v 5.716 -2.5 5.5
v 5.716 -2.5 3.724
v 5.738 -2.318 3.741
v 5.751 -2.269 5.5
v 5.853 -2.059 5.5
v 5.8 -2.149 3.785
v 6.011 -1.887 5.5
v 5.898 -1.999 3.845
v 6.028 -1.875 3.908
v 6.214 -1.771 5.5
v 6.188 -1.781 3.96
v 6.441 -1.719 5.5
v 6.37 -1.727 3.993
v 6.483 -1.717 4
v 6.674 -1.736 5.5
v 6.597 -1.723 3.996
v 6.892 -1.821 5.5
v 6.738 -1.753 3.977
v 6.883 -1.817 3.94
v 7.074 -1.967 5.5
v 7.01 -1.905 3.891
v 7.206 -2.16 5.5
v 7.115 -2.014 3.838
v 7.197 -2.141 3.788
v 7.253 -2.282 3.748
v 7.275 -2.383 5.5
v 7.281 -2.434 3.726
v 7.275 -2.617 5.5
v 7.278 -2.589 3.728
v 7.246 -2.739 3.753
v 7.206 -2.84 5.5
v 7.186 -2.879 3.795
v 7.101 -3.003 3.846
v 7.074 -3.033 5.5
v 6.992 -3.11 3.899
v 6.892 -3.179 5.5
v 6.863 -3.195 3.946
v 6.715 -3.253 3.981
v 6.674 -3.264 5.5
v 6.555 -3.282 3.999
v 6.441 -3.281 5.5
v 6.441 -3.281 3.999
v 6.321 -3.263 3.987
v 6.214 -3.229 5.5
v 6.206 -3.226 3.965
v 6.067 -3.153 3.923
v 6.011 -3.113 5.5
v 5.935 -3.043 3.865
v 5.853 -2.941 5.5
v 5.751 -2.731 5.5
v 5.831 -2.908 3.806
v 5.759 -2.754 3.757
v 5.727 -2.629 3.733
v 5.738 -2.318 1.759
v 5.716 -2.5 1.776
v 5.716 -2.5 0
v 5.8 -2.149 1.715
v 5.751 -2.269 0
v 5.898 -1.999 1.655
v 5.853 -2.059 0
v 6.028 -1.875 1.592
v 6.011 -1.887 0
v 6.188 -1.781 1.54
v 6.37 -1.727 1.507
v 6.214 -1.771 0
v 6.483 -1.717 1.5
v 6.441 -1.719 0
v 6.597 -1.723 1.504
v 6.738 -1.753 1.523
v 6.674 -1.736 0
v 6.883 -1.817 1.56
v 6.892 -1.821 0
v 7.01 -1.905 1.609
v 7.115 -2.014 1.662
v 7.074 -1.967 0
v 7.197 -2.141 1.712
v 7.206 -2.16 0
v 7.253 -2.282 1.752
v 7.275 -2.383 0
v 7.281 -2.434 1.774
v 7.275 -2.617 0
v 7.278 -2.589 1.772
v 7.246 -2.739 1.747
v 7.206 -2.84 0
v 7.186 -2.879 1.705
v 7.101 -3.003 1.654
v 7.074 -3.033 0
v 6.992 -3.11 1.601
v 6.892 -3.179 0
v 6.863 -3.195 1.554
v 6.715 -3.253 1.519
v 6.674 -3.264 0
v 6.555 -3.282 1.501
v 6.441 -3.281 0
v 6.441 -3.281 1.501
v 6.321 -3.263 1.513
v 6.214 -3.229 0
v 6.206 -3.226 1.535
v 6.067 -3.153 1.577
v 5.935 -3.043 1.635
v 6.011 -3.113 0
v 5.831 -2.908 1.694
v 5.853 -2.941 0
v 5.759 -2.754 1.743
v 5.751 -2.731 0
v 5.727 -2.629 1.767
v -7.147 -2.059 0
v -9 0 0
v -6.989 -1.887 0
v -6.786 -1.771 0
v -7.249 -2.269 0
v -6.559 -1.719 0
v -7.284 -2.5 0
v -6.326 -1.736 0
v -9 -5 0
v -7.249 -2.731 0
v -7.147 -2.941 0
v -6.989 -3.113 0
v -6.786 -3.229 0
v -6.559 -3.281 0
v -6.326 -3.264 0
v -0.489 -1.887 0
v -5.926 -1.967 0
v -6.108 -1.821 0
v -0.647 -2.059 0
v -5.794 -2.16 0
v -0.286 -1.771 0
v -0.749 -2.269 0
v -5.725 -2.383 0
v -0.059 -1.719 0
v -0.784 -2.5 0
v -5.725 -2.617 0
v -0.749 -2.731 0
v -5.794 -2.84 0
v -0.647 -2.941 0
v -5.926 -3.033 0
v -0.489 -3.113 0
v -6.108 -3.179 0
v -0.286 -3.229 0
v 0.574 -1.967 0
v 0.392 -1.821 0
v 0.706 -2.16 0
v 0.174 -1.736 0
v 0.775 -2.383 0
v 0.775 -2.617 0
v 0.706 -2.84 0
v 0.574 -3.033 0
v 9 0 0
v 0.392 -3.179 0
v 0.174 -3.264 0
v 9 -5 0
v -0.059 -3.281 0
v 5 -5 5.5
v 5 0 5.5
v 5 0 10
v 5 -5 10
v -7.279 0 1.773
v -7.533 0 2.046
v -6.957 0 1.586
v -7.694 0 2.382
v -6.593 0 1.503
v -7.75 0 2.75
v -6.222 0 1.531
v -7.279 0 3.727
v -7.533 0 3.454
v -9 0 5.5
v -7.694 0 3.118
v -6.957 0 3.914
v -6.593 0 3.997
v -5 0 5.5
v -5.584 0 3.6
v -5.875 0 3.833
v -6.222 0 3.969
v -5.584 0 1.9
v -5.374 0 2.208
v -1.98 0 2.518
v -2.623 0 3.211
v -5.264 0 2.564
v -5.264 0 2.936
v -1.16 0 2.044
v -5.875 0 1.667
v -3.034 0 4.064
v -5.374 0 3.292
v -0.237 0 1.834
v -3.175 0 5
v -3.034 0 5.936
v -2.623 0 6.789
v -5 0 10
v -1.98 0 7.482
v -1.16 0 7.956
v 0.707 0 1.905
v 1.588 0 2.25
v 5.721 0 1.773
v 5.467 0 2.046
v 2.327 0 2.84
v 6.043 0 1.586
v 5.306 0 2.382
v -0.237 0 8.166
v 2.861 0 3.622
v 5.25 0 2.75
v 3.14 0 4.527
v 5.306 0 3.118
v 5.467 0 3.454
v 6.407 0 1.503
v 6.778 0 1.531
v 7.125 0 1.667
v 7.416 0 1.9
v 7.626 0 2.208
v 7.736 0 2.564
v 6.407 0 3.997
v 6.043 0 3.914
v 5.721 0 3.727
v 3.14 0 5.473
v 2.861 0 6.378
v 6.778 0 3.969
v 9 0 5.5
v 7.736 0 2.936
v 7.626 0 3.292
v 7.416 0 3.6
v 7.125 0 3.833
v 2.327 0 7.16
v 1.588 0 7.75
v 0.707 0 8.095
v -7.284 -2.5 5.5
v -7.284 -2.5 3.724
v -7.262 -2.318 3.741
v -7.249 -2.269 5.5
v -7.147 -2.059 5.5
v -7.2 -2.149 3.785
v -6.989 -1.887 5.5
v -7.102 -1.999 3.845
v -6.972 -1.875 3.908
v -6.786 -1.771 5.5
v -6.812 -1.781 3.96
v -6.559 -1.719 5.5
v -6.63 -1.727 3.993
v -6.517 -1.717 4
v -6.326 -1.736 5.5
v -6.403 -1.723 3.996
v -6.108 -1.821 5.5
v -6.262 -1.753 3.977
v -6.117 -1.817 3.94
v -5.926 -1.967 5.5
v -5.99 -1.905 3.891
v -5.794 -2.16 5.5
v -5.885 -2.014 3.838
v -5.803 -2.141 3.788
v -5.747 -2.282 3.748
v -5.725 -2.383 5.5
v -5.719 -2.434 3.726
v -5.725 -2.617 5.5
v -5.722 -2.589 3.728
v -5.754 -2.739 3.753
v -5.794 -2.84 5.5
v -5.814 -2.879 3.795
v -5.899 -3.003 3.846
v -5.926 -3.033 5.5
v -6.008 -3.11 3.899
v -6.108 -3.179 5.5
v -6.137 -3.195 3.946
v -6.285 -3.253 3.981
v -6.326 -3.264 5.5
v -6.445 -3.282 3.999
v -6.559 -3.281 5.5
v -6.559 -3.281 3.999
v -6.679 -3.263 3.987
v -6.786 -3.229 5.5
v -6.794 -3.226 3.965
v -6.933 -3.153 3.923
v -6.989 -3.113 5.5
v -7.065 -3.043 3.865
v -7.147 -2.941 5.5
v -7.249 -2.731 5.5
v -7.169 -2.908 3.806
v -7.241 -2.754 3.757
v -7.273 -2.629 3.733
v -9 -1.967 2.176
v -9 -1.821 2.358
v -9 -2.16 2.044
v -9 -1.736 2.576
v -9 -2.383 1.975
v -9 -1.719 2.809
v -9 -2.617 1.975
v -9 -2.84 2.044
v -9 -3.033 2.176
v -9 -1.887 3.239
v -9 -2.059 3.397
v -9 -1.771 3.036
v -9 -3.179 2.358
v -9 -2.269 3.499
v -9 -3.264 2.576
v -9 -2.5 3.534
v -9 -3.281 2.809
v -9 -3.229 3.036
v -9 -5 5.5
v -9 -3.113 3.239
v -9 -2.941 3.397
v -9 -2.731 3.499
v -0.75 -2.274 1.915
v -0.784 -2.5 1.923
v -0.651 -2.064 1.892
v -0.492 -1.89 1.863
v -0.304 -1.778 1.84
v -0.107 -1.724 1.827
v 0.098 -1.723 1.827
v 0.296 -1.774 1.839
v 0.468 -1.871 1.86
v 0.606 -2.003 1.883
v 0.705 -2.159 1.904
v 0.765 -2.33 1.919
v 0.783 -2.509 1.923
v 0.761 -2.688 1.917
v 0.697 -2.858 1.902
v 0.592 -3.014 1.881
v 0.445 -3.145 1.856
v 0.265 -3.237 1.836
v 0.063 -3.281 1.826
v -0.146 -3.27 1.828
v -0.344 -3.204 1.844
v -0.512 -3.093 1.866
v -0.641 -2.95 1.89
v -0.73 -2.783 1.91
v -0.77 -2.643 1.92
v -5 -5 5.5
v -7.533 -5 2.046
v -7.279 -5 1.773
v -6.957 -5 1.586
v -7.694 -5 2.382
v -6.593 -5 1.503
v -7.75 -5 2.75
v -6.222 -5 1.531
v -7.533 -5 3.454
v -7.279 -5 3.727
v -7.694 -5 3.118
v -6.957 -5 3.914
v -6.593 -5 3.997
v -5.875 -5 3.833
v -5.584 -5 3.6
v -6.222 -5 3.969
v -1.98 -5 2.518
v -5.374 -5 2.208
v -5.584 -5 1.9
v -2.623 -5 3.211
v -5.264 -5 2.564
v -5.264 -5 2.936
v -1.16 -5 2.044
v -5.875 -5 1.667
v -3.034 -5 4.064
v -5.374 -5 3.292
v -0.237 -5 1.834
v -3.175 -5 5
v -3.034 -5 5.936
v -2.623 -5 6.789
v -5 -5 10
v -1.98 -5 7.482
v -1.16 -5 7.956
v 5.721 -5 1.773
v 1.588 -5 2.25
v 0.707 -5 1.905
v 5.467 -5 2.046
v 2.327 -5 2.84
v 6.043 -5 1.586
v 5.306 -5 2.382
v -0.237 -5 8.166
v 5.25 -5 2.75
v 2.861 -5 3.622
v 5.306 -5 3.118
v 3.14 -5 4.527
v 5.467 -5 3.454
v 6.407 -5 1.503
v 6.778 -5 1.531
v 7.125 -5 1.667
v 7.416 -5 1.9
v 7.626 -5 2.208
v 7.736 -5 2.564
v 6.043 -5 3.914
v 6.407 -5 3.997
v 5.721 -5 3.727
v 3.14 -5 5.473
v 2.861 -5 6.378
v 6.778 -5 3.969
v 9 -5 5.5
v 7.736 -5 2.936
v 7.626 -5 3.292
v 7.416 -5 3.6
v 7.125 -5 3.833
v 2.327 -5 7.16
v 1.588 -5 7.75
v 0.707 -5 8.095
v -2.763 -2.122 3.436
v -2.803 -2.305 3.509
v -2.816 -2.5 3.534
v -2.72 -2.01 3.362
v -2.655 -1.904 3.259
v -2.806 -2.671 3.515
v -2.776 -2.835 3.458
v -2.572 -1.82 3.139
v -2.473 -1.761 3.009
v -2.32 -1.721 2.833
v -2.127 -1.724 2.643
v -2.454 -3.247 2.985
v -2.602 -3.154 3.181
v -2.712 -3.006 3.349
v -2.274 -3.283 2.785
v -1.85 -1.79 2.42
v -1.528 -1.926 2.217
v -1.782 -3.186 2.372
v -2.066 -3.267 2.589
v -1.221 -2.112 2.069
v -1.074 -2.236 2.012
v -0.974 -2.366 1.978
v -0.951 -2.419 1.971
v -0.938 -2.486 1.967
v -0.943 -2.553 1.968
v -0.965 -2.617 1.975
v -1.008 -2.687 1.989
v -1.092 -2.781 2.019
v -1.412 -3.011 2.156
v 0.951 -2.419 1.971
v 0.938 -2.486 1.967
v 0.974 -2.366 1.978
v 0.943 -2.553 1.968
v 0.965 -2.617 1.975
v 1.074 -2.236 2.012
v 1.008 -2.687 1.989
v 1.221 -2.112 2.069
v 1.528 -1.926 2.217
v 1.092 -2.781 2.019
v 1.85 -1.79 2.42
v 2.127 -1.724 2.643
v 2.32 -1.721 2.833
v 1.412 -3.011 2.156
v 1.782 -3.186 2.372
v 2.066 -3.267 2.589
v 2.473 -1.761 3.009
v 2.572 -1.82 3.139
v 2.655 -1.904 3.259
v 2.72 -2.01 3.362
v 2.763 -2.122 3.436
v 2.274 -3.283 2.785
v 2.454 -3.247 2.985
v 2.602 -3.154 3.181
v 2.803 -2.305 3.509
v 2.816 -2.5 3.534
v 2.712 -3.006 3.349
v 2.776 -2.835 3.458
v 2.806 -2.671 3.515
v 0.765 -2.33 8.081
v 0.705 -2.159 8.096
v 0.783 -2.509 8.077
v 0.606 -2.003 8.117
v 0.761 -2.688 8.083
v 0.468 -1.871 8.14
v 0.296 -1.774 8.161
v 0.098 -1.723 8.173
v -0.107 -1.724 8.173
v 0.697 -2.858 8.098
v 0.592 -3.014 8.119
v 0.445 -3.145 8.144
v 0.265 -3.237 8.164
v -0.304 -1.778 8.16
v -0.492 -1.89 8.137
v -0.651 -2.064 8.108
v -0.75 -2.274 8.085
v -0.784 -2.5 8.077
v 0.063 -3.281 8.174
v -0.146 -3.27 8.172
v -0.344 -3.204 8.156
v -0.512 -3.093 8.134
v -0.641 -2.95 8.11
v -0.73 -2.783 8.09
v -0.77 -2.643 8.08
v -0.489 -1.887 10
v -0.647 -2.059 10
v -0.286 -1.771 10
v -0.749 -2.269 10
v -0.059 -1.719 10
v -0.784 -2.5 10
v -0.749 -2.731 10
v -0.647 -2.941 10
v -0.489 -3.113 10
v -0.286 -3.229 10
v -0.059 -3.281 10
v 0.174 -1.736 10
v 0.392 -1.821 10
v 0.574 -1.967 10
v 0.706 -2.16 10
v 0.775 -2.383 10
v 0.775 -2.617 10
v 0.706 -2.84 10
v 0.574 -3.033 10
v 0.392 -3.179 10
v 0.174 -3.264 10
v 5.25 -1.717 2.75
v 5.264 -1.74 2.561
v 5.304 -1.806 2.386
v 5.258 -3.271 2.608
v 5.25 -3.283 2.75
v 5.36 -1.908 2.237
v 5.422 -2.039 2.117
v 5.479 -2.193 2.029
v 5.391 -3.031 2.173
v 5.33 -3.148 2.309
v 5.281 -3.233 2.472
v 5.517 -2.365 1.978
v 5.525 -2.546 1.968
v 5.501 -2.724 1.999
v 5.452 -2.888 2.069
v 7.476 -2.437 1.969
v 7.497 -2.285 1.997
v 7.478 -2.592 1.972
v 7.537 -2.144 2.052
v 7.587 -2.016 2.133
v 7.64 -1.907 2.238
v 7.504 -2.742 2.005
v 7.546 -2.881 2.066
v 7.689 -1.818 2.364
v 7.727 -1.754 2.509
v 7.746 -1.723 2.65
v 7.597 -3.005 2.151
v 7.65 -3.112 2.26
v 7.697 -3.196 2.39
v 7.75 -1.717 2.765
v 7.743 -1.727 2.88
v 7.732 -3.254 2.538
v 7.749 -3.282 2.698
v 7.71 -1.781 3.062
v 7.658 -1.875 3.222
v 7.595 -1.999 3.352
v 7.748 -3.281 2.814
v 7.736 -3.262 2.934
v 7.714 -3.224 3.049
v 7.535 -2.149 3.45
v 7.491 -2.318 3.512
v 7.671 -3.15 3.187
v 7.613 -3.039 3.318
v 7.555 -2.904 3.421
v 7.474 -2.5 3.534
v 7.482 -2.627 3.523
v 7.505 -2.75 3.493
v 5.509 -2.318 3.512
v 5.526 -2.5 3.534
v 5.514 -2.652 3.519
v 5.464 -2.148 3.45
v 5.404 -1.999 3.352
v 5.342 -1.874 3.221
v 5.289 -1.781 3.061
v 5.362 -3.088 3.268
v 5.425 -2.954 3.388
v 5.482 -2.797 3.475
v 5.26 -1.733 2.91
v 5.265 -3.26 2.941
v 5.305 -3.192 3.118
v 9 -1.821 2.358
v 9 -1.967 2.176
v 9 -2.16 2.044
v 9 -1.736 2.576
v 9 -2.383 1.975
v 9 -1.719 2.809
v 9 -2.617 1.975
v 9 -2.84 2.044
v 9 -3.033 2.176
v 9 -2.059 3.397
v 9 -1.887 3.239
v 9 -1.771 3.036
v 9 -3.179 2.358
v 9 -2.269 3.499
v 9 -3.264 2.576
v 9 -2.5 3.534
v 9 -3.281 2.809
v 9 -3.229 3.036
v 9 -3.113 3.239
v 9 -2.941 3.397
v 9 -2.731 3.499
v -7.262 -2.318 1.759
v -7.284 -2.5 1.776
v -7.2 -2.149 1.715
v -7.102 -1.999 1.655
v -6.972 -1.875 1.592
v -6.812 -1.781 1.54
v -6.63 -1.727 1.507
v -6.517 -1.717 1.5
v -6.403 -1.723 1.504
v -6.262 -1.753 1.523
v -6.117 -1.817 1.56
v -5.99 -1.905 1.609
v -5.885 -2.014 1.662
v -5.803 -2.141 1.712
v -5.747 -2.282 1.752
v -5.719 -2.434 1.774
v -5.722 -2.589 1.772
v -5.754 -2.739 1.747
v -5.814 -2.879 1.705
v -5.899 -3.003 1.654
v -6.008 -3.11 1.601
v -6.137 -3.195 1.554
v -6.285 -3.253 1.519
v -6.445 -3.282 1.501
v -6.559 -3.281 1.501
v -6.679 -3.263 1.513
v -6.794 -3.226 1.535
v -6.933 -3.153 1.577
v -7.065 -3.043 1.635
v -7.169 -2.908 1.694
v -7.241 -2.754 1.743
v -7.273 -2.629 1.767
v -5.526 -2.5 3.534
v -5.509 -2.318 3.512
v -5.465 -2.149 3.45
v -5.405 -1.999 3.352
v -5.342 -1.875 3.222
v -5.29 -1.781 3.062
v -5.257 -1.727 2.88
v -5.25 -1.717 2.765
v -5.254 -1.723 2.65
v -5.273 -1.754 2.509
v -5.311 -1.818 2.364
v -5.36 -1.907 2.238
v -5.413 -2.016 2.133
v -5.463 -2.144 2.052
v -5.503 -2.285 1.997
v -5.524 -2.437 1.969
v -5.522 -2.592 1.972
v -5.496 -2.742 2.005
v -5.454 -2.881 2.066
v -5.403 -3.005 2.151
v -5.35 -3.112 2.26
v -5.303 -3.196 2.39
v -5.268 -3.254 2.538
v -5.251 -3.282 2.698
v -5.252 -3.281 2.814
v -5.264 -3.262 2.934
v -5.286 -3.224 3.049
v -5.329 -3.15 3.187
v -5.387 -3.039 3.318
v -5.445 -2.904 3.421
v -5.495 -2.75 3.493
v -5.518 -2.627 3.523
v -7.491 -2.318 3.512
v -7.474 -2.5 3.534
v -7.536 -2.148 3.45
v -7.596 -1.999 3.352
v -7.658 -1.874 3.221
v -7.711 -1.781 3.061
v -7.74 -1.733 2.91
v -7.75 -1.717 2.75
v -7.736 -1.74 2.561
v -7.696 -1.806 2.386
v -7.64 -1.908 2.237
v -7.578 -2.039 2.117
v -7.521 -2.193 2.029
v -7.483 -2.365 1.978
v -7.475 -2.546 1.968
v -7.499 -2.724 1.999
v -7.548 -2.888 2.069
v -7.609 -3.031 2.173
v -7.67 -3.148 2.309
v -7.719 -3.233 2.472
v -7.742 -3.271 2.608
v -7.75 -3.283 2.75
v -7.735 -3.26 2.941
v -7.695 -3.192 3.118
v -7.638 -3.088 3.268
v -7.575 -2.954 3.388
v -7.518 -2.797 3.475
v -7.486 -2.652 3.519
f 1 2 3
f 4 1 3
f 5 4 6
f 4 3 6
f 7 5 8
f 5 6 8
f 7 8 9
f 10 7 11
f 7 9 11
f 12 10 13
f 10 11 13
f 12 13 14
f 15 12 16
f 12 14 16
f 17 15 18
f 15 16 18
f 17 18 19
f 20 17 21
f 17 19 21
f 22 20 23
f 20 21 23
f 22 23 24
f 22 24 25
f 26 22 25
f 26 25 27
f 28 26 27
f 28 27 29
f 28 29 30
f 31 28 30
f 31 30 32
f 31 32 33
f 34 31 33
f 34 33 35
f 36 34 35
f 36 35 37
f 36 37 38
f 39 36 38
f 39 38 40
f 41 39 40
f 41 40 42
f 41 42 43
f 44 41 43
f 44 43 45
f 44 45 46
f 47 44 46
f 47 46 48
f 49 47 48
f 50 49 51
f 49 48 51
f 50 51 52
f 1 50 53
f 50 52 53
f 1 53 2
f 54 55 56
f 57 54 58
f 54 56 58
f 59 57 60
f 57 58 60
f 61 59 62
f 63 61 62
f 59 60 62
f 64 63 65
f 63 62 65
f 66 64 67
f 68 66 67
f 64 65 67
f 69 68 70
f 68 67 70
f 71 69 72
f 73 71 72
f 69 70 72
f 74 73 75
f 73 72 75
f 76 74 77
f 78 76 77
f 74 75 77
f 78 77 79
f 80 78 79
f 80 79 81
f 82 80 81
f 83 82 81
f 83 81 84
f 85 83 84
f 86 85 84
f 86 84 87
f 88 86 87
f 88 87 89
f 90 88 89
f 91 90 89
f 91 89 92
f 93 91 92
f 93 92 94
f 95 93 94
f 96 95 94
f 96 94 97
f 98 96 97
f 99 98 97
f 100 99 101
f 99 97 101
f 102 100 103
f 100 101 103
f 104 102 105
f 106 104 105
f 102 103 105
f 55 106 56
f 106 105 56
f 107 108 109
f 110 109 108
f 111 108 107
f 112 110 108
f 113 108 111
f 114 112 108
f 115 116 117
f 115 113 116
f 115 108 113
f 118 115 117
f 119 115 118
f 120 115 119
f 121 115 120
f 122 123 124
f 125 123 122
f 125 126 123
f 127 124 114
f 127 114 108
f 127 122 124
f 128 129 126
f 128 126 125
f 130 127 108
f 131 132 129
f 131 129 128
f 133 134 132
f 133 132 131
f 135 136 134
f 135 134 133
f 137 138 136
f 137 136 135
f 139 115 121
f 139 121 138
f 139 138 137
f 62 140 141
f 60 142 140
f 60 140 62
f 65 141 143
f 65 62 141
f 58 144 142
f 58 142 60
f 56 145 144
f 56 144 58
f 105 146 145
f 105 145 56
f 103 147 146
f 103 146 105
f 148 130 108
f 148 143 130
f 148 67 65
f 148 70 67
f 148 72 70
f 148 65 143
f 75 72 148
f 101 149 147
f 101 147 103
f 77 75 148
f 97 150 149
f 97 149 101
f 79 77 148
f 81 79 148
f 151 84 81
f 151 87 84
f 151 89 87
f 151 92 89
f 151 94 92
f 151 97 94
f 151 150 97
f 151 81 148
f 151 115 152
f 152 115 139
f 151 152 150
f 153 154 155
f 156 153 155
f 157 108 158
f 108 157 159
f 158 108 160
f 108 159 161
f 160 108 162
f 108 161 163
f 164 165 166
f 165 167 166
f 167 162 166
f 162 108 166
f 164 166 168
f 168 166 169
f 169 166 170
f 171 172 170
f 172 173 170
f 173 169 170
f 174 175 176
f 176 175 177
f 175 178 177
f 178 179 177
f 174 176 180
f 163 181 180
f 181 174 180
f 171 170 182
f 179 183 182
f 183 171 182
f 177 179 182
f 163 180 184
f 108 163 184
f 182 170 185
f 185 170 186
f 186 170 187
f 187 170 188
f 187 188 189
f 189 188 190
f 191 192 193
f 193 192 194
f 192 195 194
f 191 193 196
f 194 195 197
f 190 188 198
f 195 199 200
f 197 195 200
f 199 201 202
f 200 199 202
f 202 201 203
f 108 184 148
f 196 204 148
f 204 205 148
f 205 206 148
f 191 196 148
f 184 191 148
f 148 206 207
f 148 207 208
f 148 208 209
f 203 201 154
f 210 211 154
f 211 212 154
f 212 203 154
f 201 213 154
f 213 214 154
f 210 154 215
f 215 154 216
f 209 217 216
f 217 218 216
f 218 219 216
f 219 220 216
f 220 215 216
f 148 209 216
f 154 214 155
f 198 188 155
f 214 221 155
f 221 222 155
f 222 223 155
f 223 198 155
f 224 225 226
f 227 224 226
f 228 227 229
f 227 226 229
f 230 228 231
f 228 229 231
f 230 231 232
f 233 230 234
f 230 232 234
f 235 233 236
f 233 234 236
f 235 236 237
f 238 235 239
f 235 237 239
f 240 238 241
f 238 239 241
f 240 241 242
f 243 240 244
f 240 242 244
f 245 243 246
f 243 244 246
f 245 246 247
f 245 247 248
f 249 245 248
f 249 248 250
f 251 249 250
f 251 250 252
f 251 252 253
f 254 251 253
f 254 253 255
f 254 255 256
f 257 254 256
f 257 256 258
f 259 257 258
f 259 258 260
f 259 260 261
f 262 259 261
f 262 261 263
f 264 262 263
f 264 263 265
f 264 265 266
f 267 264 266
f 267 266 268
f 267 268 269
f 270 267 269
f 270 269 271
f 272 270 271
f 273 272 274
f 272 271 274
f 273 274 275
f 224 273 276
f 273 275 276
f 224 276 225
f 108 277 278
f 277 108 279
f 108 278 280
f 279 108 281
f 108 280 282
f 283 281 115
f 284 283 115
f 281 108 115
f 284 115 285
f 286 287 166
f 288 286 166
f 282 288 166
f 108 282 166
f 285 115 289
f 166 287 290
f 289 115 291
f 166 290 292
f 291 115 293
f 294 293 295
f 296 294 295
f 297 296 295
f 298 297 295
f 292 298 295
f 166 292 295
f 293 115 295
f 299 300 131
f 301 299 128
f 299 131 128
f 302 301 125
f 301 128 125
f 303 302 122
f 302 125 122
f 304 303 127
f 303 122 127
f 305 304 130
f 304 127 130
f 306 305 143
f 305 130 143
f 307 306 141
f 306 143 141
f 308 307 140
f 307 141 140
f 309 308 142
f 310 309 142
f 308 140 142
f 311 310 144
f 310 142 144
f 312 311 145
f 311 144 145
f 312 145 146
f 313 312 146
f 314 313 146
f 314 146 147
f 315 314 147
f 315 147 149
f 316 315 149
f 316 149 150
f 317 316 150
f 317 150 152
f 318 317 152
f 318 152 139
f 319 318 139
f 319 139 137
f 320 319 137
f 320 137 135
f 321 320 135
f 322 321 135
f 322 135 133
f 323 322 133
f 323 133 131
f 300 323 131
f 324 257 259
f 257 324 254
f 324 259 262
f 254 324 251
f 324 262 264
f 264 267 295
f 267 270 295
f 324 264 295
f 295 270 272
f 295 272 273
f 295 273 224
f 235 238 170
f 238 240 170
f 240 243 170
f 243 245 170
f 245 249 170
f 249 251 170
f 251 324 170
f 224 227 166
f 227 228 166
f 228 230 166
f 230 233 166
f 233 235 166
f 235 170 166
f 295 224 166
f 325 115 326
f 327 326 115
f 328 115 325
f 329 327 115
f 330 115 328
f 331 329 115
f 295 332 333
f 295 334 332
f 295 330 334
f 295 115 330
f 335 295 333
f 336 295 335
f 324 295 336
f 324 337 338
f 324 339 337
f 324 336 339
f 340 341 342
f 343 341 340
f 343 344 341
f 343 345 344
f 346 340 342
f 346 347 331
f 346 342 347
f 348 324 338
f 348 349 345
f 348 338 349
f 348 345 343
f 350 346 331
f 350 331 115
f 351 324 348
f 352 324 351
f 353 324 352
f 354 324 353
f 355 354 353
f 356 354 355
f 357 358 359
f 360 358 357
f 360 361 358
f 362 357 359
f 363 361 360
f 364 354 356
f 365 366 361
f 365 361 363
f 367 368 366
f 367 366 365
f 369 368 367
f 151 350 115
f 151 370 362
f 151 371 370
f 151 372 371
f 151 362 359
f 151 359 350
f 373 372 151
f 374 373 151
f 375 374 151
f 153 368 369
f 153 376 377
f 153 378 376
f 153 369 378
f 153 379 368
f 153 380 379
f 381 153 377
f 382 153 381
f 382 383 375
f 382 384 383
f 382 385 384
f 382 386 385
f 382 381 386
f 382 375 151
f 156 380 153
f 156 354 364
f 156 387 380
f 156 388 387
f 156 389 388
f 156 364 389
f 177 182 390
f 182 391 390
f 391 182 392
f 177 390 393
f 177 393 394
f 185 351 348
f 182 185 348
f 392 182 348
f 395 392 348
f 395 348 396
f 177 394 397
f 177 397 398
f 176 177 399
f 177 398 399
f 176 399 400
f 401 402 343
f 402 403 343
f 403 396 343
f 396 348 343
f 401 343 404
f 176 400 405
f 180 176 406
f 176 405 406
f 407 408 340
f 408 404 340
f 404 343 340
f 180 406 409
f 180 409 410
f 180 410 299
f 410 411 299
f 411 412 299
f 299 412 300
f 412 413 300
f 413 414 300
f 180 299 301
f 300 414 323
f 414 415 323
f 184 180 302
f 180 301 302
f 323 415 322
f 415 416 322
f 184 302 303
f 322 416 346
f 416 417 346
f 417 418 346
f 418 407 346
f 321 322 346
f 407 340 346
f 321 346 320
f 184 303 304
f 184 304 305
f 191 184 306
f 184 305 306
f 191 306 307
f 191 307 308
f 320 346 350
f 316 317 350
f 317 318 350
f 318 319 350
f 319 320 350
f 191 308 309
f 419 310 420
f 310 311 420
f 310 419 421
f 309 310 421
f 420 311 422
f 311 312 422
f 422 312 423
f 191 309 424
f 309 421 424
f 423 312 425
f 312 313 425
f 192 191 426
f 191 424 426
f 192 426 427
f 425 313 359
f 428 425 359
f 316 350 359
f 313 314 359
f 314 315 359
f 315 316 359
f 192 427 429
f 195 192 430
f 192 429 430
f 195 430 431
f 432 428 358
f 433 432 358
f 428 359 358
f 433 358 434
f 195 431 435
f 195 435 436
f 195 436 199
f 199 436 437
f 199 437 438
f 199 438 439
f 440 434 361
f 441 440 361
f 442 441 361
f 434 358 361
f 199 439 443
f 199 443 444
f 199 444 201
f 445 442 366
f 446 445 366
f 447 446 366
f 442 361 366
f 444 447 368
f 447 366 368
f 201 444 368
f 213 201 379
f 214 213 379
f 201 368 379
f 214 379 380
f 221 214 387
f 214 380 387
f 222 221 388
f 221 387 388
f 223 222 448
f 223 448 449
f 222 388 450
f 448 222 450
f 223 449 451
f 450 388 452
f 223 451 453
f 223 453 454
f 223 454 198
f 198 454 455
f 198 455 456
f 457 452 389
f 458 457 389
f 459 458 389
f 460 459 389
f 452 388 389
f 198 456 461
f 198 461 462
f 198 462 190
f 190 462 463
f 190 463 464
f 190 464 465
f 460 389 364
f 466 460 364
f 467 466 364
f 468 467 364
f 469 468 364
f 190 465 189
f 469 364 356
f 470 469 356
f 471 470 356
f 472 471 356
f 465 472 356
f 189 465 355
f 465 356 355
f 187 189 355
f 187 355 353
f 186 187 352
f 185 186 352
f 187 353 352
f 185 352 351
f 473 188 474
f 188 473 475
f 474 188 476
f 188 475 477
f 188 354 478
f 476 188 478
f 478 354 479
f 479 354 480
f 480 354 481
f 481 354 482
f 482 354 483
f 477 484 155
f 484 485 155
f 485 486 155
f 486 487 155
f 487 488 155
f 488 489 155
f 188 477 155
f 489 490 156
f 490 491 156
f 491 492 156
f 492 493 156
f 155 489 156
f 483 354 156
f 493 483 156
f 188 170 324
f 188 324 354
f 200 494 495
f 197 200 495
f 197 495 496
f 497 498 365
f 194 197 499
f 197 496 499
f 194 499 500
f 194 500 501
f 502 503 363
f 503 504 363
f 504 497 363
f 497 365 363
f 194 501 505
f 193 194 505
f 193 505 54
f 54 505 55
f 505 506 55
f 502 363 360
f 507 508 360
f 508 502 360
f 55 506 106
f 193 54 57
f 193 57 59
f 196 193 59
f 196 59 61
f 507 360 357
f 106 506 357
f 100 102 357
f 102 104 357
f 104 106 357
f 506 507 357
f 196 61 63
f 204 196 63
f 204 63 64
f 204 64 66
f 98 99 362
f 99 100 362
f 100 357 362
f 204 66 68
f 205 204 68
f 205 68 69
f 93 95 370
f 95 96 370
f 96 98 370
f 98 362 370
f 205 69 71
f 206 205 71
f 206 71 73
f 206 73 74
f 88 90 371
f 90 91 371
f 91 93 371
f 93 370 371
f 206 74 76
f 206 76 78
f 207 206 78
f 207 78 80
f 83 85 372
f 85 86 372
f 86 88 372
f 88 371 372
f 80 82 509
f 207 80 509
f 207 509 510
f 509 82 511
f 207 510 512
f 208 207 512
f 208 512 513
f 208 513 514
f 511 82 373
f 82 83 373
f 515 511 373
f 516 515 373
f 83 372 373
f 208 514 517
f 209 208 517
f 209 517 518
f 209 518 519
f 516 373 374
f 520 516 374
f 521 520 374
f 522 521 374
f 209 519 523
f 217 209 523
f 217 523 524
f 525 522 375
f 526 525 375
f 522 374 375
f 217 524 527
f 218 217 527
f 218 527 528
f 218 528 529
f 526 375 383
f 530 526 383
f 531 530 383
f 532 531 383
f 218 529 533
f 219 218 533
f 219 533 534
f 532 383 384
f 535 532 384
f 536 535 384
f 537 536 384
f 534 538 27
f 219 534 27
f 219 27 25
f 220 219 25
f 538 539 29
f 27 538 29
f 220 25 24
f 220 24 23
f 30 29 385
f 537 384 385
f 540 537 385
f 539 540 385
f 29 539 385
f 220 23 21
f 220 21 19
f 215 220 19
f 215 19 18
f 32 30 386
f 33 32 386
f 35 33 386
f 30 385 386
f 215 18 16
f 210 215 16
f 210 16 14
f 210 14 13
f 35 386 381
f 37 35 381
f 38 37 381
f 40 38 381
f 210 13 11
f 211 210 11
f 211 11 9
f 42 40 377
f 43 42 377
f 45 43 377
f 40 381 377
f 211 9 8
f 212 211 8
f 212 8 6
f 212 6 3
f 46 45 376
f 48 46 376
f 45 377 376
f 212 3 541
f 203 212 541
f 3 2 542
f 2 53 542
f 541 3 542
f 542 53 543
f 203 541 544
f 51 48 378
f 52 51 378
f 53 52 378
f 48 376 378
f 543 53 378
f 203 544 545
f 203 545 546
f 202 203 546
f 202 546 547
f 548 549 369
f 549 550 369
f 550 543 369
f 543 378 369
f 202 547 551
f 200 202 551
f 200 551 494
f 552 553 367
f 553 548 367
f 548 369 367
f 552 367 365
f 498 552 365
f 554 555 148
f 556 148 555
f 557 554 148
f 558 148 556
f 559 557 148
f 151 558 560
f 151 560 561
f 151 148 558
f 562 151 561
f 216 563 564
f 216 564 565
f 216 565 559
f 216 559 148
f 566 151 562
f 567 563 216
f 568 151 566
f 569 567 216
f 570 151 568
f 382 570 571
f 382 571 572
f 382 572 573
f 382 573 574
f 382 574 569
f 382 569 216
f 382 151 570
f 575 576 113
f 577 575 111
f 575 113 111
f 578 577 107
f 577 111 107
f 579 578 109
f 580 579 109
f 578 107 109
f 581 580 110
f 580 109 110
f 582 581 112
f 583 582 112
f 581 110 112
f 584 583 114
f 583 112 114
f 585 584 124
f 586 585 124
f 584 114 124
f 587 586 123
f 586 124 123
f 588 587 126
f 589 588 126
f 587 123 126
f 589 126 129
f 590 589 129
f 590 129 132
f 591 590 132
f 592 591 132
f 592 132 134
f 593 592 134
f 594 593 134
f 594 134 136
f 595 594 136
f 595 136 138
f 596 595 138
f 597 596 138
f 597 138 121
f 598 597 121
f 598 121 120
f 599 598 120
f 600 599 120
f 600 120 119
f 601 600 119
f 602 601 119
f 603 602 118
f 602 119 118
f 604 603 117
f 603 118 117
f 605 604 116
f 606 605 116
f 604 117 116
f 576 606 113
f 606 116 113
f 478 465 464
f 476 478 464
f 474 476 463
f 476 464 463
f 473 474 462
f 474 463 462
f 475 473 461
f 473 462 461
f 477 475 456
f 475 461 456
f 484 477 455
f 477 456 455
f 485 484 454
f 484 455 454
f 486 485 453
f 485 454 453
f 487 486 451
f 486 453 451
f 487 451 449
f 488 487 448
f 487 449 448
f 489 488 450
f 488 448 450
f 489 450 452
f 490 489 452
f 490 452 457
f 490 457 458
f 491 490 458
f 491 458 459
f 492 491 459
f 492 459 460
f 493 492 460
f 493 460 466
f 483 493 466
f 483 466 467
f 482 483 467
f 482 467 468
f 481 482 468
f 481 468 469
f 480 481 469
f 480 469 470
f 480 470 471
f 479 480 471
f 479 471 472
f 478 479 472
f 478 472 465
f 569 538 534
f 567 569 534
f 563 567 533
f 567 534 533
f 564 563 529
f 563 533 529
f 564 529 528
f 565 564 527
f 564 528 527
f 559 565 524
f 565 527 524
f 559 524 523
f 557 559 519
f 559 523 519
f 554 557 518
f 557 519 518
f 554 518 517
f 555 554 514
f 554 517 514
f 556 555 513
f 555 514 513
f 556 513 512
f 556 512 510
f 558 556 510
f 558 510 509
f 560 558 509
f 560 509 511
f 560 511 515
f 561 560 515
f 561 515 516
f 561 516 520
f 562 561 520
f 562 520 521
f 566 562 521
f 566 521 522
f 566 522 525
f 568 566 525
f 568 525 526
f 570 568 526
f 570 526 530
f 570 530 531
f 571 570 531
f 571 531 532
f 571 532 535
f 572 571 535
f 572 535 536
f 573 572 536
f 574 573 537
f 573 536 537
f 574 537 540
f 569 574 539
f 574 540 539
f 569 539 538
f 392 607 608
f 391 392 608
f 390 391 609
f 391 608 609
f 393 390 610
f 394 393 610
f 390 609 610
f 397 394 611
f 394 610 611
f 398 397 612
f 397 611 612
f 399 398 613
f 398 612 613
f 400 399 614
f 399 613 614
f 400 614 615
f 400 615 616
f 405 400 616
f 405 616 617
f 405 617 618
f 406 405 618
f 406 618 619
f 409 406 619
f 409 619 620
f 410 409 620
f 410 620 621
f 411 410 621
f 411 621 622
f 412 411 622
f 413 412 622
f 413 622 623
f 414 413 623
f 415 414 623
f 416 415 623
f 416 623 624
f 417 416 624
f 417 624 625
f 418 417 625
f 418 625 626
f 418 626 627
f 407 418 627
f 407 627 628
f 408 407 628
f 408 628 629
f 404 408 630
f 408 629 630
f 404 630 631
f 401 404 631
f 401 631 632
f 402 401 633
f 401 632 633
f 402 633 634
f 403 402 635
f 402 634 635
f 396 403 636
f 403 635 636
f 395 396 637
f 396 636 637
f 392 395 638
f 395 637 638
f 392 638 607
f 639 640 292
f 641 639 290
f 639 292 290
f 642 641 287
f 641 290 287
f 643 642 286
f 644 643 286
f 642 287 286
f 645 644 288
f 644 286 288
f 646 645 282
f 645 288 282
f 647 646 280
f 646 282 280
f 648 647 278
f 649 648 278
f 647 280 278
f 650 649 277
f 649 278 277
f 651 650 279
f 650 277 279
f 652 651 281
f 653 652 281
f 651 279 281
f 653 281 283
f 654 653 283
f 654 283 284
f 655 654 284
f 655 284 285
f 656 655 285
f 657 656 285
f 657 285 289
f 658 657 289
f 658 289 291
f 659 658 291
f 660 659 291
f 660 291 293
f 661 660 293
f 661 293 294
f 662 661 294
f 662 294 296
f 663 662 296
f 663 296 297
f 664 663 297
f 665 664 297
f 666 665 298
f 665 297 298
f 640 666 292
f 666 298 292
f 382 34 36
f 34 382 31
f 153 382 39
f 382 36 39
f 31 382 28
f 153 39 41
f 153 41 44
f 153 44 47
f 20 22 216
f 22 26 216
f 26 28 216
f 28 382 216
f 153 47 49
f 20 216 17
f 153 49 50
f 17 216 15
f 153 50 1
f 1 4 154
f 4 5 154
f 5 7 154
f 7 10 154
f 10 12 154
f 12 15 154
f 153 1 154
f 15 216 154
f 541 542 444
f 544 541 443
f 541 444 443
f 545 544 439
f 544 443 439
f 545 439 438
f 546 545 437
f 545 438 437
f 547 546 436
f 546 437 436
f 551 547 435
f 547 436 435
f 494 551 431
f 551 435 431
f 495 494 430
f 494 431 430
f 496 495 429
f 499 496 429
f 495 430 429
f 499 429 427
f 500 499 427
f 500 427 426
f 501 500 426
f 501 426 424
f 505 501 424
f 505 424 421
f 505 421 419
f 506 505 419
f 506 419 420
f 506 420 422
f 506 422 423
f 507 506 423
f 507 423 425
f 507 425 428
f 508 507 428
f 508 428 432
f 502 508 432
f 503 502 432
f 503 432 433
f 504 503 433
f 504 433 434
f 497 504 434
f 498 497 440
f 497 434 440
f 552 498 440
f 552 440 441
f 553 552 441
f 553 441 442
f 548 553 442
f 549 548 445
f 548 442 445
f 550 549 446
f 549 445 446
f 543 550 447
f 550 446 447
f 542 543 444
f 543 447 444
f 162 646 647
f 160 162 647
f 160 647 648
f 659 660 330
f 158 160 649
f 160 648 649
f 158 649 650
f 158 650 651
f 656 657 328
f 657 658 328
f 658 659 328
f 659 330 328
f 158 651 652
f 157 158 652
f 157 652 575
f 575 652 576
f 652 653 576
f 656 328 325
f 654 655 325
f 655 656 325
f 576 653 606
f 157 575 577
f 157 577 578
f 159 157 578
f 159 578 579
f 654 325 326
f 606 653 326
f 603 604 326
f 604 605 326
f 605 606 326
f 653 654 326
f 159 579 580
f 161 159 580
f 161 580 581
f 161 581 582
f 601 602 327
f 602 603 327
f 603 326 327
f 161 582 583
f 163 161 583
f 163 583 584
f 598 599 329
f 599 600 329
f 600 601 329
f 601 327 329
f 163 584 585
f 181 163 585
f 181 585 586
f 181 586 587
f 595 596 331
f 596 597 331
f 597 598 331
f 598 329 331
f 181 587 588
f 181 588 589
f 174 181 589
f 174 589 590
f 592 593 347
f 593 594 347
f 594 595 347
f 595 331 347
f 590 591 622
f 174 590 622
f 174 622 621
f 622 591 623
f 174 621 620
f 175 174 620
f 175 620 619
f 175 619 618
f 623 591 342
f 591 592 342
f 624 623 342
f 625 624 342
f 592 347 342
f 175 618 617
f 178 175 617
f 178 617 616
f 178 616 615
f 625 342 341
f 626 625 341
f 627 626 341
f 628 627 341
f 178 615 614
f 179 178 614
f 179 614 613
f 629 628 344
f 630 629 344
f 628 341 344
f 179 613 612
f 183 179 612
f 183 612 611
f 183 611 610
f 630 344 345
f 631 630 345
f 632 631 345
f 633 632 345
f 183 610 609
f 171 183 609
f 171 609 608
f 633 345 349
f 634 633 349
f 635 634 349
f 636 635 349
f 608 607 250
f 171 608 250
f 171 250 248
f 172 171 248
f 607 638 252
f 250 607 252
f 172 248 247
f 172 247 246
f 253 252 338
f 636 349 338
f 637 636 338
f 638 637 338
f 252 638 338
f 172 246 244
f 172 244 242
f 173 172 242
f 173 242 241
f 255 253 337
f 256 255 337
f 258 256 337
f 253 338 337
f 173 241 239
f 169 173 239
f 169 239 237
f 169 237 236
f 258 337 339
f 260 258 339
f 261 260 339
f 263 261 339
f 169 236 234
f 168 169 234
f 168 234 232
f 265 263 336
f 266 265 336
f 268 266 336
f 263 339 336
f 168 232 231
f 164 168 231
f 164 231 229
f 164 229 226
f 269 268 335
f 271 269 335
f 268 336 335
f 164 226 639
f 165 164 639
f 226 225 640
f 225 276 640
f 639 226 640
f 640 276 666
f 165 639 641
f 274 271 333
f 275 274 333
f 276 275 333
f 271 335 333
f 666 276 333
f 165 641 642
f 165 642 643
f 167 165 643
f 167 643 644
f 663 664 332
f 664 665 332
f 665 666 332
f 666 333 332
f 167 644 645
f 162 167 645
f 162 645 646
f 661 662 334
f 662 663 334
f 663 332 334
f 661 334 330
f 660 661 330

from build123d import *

# Parameters (mm, degrees)
SKETCH1_W                  = 18
SKETCH1_H                  = 10
BOSS_EXTRUDE1_DEPTH        = 5
SKETCH2_W                  = 4
SKETCH2_H                  = 4.5
CUT_EXTRUDE1_DEPTH         = 15.352700094
SKETCH3_W                  = 4
SKETCH3_H                  = 4.5
CUT_EXTRUDE2_DEPTH         = 15.352700094
F_2_5_2_5_DIAMETER_HOLE1_D = 2.5
HOLE1_D                    = 1.567
HOLE1_DEPTH                = 19.526024769
HOLE2_D                    = 1.567
HOLE2_DEPTH                = 7.276024769
HOLE3_D                    = 6.35
HOLE4_D                    = 1.567
HOLE4_DEPTH                = 11.923191142


with BuildPart() as part:
    # Sketch1 → Boss-Extrude1 (new body)
    with BuildSketch(Plane.XZ.offset(5)):
        with Locations((0, 5)):
            Rectangle(SKETCH1_W, SKETCH1_H)
    extrude(amount=-BOSS_EXTRUDE1_DEPTH)

    # Sketch2 → Cut-Extrude1 (cut, through all)
    with BuildSketch(Plane(origin=(0, 0, 0), x_dir=(-1, 0, 0), z_dir=(0, 1, 0))):
        with Locations((7, 7.75)):
            Rectangle(SKETCH2_W, SKETCH2_H)
    extrude(amount=-CUT_EXTRUDE1_DEPTH, mode=Mode.SUBTRACT)

    # Sketch3 → Cut-Extrude2 (cut, through all)
    with BuildSketch(Plane(origin=(0, 0, 0), x_dir=(-1, 0, 0), z_dir=(0, 1, 0))):
        with Locations((-7, 7.75)):
            Rectangle(SKETCH3_W, SKETCH3_H)
    extrude(amount=-CUT_EXTRUDE2_DEPTH, mode=Mode.SUBTRACT)

    # Ø2.5 (2.5) Diameter Hole1 (through all)
    with Locations(Plane(origin=(0, 0, 0), x_dir=(1, 0, 0), z_dir=(0, 1, 0))):
        with Locations((6.5, -2.75), (-6.5, -2.75)):
            Hole(F_2_5_2_5_DIAMETER_HOLE1_D / 2)

    # Hole1
    with Locations(Plane(origin=(9, 0, 0), x_dir=(0, 0, -1), z_dir=(1, 0, 0))):
        with Locations((-2.75, -2.5)):
            Hole(HOLE1_D / 2, depth=HOLE1_DEPTH)

    # Hole2
    with Locations(Plane.XY.offset(5.5)):
        with Locations((6.5, -2.5), (-6.5, -2.5)):
            Hole(HOLE2_D / 2, depth=HOLE2_DEPTH)

    # Hole3 (through all)
    with Locations(Plane(origin=(0, 0, 0), x_dir=(1, 0, 0), z_dir=(0, 1, 0))):
        with Locations((0, -5)):
            Hole(HOLE3_D / 2)

    # Hole4
    with Locations(Plane.XY.offset(10)):
        with Locations((0, -2.5)):
            Hole(HOLE4_D / 2, depth=HOLE4_DEPTH)


solid = part.part
